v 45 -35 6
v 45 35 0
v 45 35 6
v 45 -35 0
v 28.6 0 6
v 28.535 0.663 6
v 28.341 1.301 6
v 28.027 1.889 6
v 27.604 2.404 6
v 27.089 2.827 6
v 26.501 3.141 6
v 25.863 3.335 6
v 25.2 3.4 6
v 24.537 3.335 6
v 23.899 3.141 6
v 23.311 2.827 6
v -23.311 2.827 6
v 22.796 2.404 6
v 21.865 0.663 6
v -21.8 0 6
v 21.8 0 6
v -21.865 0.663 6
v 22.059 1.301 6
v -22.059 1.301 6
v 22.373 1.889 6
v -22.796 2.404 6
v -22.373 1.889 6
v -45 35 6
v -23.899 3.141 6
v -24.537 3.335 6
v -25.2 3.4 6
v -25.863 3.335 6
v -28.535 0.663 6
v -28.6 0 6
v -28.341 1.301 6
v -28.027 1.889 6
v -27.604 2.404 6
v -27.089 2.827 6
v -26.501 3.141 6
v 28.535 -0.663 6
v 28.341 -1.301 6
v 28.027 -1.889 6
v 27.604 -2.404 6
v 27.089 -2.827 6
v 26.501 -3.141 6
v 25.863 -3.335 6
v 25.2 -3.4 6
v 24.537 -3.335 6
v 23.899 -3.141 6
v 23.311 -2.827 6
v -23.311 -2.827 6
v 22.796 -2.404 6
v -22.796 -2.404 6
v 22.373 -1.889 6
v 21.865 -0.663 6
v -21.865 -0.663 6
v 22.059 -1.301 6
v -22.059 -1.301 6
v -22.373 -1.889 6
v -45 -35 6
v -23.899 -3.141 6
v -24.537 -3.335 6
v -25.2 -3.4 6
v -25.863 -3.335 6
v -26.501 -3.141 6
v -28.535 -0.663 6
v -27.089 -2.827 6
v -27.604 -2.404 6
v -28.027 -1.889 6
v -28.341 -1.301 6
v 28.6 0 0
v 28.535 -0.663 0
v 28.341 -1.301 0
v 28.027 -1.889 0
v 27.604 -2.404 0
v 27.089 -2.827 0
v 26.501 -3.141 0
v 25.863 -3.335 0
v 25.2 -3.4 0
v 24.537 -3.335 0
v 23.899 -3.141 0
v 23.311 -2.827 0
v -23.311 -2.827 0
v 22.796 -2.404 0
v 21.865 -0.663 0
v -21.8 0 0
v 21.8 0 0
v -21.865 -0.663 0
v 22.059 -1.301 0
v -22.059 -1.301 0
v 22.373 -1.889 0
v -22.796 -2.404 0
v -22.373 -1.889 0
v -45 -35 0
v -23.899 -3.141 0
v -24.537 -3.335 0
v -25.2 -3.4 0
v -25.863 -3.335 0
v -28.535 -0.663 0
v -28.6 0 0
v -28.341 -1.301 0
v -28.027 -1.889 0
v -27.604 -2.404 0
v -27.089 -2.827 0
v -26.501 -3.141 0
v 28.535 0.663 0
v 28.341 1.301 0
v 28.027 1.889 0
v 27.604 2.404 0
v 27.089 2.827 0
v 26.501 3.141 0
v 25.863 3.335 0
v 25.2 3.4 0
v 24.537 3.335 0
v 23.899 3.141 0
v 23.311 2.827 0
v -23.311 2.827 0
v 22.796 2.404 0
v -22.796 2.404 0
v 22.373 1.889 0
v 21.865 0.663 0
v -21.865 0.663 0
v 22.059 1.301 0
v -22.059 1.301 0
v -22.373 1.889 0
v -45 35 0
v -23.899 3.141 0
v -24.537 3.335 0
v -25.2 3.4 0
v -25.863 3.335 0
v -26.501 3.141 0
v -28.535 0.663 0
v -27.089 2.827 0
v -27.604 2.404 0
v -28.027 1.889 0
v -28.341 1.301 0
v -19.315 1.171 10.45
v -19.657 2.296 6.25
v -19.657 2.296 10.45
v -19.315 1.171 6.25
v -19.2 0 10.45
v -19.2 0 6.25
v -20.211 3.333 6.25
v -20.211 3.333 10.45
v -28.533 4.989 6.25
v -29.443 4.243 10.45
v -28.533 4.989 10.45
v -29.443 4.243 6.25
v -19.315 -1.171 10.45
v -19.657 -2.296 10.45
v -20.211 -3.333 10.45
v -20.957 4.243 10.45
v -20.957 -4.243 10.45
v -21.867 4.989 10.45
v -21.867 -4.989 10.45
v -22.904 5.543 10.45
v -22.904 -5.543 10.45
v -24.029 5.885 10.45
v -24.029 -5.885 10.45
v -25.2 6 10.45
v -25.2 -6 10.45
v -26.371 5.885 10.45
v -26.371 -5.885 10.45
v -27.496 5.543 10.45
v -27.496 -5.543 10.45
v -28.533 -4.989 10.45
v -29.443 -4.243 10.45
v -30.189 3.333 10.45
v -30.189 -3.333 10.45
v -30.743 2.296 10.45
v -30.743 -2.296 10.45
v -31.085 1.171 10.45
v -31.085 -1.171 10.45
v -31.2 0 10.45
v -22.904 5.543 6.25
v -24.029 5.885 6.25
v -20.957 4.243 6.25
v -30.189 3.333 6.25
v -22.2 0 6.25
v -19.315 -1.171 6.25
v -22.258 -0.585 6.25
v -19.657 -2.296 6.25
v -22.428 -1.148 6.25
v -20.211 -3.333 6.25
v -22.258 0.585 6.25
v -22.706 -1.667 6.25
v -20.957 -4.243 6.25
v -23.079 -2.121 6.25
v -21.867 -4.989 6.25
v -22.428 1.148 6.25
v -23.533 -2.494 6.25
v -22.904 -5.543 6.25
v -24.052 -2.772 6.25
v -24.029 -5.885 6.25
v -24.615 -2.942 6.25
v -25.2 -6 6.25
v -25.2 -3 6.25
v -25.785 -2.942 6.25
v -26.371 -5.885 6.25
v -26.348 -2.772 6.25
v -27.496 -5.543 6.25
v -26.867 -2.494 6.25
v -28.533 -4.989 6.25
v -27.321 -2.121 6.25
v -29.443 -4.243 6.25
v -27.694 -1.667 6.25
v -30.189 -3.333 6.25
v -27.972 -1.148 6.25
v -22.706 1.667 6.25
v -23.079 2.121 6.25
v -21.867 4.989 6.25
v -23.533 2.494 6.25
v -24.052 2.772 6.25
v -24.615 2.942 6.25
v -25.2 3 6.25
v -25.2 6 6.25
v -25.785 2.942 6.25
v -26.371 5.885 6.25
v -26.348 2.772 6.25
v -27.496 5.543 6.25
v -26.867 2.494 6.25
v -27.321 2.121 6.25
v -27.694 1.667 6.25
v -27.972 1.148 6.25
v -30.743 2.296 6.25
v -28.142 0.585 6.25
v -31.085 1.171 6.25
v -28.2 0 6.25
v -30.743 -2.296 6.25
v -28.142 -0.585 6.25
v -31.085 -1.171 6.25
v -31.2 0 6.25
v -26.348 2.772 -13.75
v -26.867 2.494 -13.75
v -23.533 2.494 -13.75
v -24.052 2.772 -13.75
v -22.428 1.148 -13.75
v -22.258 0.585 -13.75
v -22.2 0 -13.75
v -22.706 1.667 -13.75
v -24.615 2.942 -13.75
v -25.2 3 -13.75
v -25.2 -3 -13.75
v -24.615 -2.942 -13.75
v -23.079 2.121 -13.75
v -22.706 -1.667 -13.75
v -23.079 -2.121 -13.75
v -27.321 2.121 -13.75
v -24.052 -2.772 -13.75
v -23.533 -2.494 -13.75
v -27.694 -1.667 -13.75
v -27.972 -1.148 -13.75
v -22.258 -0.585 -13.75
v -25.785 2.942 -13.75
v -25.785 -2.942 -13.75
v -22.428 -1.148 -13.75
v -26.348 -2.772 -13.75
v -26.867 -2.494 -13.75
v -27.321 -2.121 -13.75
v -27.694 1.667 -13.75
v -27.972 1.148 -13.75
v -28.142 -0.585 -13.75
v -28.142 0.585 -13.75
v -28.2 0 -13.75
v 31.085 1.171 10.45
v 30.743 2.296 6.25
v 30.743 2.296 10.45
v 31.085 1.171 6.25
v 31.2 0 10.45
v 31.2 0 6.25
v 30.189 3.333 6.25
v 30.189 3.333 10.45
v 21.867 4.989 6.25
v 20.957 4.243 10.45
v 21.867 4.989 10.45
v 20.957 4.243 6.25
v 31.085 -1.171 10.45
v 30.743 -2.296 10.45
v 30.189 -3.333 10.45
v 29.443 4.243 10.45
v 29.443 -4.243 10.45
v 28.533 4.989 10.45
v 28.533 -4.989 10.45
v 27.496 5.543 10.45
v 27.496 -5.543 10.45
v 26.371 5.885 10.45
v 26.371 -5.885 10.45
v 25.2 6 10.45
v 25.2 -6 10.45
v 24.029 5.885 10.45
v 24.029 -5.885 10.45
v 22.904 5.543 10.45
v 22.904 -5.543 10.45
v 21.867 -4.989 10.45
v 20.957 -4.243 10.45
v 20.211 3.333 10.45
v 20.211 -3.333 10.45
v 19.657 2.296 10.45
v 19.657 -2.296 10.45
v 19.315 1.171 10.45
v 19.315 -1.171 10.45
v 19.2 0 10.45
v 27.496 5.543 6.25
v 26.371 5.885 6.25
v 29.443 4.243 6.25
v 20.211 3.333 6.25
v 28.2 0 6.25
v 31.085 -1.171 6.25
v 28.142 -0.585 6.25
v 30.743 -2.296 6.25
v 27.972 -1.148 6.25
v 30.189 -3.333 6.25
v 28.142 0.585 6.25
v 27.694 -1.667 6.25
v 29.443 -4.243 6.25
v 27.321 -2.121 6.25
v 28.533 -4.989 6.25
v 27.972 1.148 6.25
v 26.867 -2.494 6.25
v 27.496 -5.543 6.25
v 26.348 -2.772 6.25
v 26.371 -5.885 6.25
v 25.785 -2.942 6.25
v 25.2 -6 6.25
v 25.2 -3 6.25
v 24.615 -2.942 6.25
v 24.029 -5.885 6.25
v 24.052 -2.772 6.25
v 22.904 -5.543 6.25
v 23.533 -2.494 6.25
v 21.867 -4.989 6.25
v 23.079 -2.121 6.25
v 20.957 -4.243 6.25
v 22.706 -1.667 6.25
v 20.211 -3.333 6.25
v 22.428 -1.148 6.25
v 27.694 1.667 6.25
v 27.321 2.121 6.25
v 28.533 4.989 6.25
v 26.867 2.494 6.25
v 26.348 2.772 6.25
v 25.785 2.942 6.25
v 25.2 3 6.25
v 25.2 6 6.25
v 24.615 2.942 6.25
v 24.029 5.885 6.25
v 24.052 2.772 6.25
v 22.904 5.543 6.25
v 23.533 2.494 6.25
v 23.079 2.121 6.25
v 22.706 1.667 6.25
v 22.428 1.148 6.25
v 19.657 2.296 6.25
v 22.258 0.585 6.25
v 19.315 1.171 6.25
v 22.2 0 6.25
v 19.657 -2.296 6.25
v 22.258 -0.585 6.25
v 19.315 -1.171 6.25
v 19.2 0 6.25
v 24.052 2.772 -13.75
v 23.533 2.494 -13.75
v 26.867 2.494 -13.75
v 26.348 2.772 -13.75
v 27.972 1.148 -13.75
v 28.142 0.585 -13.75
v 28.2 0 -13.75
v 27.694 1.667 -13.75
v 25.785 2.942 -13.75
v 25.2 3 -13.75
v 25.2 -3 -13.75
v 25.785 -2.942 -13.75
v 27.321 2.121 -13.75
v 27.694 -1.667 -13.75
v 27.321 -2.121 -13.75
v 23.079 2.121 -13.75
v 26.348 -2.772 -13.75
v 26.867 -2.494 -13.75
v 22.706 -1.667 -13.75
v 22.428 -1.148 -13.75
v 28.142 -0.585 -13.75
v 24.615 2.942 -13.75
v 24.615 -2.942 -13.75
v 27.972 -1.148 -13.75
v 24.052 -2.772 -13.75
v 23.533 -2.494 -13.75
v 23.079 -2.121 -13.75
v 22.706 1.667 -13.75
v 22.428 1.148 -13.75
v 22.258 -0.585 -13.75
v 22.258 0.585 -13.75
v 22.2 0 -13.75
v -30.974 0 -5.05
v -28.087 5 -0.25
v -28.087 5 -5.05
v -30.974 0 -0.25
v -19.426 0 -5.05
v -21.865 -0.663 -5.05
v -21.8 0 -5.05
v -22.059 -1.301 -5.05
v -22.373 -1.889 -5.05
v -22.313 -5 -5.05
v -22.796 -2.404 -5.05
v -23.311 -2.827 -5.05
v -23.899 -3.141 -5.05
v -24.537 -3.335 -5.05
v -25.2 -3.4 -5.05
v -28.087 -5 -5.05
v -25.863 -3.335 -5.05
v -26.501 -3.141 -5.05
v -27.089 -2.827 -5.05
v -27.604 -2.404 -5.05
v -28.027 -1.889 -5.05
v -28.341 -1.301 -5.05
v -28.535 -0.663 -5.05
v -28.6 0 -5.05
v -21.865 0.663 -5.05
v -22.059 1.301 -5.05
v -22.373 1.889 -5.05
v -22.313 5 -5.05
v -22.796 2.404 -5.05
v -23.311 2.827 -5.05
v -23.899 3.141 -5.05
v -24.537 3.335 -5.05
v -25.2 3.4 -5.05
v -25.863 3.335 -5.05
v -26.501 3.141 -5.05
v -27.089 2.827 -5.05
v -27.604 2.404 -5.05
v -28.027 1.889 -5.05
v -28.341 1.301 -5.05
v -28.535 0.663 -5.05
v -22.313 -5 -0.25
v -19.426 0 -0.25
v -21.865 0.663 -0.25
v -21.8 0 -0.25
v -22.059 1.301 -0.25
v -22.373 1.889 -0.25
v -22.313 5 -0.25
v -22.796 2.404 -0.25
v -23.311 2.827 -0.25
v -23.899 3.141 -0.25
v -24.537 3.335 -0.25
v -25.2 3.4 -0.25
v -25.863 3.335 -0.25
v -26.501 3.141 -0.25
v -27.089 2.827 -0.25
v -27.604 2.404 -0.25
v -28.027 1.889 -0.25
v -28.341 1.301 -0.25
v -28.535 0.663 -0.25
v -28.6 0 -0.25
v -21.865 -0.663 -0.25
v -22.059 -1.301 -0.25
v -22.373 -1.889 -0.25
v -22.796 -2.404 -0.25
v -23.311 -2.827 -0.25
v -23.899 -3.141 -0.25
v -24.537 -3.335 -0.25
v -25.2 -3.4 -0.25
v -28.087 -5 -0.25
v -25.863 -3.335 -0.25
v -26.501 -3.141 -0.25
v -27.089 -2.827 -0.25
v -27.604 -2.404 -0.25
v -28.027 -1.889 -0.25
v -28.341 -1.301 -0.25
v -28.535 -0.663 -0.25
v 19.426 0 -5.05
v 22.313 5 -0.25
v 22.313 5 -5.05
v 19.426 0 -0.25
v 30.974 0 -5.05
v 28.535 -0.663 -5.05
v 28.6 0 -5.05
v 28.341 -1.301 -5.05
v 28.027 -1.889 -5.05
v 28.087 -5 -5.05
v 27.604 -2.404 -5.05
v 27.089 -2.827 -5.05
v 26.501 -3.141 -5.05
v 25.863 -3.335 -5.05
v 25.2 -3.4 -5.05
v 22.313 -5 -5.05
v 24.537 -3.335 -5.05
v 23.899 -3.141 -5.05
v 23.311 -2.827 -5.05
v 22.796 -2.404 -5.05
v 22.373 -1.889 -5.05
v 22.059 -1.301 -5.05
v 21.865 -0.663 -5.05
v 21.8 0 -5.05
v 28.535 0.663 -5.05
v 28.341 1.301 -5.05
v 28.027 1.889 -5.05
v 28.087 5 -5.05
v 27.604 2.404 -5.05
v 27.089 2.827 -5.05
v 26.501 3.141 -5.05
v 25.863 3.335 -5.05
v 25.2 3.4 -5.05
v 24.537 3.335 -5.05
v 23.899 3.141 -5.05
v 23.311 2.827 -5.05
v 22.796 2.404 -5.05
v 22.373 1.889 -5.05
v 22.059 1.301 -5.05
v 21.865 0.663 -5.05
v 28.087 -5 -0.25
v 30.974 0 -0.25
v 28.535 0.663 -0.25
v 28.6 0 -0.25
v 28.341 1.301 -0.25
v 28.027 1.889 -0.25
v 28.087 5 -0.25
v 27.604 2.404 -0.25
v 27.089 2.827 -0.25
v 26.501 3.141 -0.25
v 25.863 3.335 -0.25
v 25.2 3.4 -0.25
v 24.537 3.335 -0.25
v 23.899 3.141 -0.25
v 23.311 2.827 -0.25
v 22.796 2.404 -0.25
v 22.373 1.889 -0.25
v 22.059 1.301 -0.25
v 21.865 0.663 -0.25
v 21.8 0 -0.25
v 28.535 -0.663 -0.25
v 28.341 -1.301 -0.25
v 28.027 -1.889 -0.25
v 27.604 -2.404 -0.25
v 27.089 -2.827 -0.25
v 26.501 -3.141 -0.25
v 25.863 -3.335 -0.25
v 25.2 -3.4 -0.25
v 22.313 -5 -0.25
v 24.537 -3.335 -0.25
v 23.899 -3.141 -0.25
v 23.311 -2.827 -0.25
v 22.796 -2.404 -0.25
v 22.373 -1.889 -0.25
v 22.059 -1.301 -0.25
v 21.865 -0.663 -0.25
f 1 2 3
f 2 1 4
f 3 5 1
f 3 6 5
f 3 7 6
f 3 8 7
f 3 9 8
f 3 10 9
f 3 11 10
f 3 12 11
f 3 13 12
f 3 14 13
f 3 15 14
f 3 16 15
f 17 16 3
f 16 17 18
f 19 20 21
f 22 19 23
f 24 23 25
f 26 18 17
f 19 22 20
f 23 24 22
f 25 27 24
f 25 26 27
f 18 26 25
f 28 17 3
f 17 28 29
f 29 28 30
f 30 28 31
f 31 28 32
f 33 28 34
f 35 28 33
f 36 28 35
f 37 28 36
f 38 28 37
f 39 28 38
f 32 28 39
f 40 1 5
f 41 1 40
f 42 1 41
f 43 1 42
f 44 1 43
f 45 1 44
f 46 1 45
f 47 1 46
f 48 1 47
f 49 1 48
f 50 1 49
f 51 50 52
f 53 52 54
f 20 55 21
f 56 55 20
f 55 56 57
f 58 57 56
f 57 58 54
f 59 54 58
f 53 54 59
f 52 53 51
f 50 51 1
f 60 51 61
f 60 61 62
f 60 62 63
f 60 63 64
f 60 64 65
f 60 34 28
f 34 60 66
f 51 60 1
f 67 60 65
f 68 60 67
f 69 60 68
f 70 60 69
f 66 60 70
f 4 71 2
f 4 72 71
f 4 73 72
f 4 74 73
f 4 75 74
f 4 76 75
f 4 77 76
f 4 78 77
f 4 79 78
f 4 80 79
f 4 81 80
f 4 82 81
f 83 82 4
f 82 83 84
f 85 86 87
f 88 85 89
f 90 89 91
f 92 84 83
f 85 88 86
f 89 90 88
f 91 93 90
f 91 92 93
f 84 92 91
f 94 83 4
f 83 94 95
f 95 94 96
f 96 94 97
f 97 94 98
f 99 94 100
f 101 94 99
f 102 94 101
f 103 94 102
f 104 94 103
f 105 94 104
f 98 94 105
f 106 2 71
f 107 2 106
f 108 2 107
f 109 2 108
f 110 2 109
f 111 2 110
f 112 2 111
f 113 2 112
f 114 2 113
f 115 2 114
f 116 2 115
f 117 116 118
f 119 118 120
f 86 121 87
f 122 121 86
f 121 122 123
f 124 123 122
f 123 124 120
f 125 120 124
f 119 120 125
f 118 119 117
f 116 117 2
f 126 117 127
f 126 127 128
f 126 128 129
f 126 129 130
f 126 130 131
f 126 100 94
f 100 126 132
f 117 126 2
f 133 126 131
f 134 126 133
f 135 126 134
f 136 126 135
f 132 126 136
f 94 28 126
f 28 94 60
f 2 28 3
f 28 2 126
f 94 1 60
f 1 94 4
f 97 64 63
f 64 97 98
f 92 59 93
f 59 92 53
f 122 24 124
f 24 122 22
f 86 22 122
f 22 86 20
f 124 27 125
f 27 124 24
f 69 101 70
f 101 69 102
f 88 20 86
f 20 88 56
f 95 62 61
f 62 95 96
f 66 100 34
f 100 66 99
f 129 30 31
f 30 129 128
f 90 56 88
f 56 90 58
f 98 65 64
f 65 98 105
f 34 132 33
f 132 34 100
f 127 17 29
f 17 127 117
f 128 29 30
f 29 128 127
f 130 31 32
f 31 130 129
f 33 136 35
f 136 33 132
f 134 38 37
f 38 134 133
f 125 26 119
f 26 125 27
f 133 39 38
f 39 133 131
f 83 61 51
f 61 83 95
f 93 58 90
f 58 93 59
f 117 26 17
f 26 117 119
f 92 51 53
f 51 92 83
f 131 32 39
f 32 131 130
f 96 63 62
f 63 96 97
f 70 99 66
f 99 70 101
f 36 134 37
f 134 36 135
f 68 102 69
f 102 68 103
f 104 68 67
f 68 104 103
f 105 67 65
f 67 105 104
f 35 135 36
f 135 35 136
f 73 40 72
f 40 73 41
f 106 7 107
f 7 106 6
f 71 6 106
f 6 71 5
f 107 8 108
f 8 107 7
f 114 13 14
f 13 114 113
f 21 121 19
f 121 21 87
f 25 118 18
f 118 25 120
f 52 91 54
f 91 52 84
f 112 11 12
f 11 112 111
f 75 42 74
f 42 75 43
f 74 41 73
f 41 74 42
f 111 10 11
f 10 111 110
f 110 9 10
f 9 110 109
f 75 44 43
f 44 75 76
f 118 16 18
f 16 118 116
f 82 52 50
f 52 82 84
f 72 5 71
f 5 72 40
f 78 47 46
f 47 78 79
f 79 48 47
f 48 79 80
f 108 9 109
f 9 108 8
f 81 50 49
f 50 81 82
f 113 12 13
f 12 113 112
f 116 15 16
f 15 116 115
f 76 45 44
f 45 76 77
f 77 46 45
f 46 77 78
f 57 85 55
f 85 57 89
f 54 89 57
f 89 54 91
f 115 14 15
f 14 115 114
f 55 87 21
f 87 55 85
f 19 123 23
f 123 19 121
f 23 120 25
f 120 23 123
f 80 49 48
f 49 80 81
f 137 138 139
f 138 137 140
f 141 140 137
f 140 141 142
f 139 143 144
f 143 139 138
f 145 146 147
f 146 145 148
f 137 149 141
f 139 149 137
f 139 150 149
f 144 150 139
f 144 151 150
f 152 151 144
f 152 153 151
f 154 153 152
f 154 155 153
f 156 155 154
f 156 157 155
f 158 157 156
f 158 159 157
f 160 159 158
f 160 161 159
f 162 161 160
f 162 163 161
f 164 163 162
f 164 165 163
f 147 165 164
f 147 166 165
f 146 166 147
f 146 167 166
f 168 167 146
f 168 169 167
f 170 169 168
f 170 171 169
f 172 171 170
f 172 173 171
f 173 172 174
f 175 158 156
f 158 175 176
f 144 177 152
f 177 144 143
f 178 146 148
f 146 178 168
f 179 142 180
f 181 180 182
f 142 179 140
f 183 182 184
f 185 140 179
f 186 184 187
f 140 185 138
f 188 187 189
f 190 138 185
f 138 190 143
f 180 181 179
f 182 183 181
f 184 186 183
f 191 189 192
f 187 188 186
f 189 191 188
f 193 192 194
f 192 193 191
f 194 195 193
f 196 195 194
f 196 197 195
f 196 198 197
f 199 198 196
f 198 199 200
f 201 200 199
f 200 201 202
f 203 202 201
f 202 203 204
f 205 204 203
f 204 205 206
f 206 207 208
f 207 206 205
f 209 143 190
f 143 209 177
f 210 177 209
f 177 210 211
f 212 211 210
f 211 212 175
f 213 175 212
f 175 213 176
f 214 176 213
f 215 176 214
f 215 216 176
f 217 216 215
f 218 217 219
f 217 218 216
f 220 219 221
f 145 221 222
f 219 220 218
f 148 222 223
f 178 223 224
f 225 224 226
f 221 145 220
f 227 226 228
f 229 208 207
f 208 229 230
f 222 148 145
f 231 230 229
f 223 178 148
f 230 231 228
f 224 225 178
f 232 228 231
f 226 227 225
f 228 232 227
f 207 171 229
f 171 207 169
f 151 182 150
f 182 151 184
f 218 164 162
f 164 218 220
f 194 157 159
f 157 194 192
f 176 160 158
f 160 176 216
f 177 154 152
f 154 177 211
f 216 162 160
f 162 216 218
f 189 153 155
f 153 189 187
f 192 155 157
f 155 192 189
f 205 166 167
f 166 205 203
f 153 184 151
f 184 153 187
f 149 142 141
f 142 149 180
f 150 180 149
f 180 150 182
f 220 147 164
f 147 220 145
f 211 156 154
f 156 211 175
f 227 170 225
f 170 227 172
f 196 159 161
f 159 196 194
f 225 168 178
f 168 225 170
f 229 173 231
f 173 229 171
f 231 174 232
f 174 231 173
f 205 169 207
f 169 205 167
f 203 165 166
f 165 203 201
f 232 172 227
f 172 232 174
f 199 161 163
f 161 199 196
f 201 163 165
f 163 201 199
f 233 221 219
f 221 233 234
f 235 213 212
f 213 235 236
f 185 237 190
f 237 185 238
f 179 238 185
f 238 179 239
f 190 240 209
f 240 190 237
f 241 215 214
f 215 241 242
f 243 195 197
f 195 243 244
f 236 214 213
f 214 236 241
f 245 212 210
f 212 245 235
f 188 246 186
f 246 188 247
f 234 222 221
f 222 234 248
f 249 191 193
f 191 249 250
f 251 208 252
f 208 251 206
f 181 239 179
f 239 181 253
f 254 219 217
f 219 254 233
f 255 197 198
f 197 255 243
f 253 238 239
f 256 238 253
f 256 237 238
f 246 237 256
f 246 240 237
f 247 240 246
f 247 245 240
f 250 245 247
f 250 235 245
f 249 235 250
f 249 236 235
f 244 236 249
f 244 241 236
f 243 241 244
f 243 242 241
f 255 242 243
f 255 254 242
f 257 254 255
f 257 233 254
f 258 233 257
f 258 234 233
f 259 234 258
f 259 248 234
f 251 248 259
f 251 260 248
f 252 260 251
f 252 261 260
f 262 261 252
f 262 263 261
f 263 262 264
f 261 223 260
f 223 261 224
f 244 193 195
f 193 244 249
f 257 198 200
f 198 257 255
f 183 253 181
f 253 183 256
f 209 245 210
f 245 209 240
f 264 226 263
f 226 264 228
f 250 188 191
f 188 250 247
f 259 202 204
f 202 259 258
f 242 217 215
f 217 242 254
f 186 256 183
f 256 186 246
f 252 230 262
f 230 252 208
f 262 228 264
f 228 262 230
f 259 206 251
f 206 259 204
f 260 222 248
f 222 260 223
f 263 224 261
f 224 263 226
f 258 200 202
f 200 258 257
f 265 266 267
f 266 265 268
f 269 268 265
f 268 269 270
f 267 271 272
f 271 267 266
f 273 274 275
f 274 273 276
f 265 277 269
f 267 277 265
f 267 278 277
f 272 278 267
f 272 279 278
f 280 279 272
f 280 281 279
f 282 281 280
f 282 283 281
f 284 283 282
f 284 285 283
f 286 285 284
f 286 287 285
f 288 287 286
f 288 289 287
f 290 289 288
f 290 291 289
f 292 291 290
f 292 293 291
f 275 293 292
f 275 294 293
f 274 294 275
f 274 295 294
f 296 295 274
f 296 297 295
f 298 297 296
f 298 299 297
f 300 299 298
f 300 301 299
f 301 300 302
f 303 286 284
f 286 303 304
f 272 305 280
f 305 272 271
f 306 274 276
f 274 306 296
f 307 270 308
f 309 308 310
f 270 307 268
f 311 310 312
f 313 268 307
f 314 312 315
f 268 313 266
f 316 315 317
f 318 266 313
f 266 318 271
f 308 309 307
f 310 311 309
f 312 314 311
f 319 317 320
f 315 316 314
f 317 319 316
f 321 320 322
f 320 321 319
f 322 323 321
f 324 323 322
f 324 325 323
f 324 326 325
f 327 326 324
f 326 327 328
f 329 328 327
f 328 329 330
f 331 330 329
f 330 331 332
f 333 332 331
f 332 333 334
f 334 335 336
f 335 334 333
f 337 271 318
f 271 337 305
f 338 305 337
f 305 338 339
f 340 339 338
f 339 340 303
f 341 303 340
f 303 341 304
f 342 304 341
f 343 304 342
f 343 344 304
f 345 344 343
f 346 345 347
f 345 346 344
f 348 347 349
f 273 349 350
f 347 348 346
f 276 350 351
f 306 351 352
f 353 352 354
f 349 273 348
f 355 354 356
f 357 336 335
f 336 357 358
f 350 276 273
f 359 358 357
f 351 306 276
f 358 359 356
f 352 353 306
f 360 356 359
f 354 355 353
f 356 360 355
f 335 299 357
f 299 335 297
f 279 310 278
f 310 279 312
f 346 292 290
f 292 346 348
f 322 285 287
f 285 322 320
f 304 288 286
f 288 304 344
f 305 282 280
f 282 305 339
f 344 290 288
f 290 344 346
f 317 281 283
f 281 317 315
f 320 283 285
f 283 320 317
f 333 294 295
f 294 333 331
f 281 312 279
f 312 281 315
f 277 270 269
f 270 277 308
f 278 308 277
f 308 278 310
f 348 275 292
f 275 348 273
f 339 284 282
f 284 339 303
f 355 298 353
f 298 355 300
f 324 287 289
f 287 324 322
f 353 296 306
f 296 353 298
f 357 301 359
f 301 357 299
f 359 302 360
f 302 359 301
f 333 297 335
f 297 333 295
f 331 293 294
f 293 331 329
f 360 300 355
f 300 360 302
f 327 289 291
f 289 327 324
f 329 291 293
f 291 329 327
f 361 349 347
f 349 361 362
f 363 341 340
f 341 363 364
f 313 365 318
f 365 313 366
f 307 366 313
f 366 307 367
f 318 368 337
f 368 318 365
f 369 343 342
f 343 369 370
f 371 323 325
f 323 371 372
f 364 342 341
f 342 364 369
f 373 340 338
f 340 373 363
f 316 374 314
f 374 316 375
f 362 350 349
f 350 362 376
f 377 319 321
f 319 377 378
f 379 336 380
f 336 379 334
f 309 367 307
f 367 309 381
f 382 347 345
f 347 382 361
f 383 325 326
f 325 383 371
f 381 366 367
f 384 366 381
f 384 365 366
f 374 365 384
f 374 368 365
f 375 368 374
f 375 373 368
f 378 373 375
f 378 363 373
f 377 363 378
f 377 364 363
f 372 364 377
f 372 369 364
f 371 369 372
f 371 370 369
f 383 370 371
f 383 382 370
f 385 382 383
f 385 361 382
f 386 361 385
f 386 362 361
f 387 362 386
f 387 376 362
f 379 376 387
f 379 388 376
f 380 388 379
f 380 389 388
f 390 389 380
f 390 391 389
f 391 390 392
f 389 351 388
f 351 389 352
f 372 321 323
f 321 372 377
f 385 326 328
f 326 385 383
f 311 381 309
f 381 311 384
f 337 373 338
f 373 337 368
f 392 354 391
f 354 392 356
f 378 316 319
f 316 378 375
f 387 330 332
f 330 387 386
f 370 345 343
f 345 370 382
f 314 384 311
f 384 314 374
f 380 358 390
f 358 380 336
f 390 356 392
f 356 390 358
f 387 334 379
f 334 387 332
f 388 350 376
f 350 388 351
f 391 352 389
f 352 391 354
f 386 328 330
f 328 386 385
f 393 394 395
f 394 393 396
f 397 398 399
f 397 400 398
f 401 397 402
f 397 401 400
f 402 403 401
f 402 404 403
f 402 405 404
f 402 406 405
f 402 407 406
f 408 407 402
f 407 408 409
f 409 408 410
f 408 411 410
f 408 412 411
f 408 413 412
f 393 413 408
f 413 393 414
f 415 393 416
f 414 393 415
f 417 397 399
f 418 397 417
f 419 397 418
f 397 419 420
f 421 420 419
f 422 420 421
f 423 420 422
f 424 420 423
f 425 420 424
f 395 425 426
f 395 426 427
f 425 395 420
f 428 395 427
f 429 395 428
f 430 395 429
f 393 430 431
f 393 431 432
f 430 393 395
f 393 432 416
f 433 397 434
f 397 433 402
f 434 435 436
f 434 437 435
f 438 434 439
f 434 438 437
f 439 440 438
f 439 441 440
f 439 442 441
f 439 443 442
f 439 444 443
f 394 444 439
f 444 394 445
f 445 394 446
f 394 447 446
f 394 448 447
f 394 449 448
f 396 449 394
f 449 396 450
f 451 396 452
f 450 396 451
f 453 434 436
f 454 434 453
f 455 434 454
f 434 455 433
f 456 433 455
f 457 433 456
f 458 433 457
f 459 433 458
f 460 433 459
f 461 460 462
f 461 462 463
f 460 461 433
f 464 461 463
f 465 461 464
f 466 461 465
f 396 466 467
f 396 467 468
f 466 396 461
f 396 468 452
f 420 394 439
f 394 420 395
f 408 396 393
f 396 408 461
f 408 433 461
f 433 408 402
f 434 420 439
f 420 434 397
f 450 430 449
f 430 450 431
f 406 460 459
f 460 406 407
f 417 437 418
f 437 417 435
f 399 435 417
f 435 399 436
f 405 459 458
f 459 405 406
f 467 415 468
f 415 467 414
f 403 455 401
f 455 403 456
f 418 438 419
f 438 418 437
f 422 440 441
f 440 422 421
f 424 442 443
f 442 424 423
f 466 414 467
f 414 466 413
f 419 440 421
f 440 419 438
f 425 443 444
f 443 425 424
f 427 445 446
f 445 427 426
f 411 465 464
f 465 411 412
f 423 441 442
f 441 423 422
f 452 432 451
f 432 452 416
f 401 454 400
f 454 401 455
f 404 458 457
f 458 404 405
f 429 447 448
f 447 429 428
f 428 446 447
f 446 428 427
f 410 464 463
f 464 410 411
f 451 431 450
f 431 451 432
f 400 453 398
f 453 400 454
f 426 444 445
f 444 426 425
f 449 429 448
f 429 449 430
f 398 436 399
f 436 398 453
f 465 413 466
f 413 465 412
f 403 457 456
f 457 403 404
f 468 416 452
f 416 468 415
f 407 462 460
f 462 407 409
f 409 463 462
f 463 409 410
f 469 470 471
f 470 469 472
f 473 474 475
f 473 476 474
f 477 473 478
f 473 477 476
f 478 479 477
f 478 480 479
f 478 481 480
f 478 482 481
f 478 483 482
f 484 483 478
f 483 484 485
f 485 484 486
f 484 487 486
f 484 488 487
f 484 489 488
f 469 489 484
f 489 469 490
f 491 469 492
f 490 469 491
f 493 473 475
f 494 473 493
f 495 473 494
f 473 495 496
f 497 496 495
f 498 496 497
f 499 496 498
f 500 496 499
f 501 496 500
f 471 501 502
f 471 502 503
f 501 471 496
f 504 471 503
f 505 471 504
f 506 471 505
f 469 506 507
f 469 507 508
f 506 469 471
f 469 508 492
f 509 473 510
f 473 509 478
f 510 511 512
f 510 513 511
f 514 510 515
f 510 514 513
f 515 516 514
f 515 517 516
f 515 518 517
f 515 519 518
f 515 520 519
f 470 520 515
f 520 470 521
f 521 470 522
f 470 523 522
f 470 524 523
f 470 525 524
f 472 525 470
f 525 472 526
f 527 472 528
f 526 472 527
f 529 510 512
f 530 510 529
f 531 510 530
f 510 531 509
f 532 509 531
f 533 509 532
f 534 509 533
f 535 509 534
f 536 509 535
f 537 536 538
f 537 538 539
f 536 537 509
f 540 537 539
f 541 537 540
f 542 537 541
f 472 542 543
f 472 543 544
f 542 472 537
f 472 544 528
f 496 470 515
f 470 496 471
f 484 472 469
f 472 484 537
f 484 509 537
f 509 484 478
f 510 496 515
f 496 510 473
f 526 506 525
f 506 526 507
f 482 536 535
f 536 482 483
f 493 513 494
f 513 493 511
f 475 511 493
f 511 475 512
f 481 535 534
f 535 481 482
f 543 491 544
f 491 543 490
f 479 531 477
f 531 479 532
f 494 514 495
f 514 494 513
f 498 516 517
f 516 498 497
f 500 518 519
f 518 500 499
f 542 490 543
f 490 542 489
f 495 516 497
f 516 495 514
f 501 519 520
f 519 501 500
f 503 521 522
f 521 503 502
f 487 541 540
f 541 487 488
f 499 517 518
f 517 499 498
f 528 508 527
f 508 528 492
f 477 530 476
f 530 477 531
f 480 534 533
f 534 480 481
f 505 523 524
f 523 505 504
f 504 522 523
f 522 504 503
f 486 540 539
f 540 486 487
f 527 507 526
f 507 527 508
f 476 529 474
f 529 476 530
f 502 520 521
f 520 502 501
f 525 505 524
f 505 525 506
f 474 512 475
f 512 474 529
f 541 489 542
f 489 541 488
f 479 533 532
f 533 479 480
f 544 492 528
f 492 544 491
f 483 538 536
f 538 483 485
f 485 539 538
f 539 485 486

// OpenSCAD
$fn = 32;

// ------------------------------------------------------------------------
// Bolted plate: 90 x 70 x 6 mm plate, 2 fasteners
// Every part is its own module, assembly() places them once.
// ------------------------------------------------------------------------

// --- part 1 ---
module plate() {
  difference() {
    translate([-45, -35, 0]) cube([90, 70, 6]);
    translate([-25.2, 0, -1]) cylinder(h = 8, d = 6.8);
    translate([25.2, 0, -1]) cylinder(h = 8, d = 6.8);
  }
}

// --- part 2 ---
module bolt1() {
  cylinder(h = 4.2, d = 12);
  translate([0, 0, -20]) cylinder(h = 20, d = 6);
}

// --- part 3 ---
module bolt2() {
  cylinder(h = 4.2, d = 12);
  translate([0, 0, -20]) cylinder(h = 20, d = 6);
}

// --- part 4 ---
module nut1() {
  difference() {
    linear_extrude(height = 4.8) polygon(points = [[5.774, 0], [2.887, 5], [-2.887, 5], [-5.774, 0], [-2.887, -5], [2.887, -5]]);
    translate([0, 0, -1]) cylinder(h = 6.8, d = 6.8);
  }
}

// --- part 5 ---
module nut2() {
  difference() {
    linear_extrude(height = 4.8) polygon(points = [[5.774, 0], [2.887, 5], [-2.887, 5], [-5.774, 0], [-2.887, -5], [2.887, -5]]);
    translate([0, 0, -1]) cylinder(h = 6.8, d = 6.8);
  }
}

// --- assembly ---
module assembly() {
  translate([0, 0, 0]) rotate([0, 0, 0]) plate();
  translate([-25.2, 0, 6.25]) rotate([0, 0, 0]) bolt1();
  translate([25.2, 0, 6.25]) rotate([0, 0, 0]) bolt2();
  translate([-25.2, 0, -5.05]) rotate([0, 0, 0]) nut1();
  translate([25.2, 0, -5.05]) rotate([0, 0, 0]) nut2();
}

assembly();
